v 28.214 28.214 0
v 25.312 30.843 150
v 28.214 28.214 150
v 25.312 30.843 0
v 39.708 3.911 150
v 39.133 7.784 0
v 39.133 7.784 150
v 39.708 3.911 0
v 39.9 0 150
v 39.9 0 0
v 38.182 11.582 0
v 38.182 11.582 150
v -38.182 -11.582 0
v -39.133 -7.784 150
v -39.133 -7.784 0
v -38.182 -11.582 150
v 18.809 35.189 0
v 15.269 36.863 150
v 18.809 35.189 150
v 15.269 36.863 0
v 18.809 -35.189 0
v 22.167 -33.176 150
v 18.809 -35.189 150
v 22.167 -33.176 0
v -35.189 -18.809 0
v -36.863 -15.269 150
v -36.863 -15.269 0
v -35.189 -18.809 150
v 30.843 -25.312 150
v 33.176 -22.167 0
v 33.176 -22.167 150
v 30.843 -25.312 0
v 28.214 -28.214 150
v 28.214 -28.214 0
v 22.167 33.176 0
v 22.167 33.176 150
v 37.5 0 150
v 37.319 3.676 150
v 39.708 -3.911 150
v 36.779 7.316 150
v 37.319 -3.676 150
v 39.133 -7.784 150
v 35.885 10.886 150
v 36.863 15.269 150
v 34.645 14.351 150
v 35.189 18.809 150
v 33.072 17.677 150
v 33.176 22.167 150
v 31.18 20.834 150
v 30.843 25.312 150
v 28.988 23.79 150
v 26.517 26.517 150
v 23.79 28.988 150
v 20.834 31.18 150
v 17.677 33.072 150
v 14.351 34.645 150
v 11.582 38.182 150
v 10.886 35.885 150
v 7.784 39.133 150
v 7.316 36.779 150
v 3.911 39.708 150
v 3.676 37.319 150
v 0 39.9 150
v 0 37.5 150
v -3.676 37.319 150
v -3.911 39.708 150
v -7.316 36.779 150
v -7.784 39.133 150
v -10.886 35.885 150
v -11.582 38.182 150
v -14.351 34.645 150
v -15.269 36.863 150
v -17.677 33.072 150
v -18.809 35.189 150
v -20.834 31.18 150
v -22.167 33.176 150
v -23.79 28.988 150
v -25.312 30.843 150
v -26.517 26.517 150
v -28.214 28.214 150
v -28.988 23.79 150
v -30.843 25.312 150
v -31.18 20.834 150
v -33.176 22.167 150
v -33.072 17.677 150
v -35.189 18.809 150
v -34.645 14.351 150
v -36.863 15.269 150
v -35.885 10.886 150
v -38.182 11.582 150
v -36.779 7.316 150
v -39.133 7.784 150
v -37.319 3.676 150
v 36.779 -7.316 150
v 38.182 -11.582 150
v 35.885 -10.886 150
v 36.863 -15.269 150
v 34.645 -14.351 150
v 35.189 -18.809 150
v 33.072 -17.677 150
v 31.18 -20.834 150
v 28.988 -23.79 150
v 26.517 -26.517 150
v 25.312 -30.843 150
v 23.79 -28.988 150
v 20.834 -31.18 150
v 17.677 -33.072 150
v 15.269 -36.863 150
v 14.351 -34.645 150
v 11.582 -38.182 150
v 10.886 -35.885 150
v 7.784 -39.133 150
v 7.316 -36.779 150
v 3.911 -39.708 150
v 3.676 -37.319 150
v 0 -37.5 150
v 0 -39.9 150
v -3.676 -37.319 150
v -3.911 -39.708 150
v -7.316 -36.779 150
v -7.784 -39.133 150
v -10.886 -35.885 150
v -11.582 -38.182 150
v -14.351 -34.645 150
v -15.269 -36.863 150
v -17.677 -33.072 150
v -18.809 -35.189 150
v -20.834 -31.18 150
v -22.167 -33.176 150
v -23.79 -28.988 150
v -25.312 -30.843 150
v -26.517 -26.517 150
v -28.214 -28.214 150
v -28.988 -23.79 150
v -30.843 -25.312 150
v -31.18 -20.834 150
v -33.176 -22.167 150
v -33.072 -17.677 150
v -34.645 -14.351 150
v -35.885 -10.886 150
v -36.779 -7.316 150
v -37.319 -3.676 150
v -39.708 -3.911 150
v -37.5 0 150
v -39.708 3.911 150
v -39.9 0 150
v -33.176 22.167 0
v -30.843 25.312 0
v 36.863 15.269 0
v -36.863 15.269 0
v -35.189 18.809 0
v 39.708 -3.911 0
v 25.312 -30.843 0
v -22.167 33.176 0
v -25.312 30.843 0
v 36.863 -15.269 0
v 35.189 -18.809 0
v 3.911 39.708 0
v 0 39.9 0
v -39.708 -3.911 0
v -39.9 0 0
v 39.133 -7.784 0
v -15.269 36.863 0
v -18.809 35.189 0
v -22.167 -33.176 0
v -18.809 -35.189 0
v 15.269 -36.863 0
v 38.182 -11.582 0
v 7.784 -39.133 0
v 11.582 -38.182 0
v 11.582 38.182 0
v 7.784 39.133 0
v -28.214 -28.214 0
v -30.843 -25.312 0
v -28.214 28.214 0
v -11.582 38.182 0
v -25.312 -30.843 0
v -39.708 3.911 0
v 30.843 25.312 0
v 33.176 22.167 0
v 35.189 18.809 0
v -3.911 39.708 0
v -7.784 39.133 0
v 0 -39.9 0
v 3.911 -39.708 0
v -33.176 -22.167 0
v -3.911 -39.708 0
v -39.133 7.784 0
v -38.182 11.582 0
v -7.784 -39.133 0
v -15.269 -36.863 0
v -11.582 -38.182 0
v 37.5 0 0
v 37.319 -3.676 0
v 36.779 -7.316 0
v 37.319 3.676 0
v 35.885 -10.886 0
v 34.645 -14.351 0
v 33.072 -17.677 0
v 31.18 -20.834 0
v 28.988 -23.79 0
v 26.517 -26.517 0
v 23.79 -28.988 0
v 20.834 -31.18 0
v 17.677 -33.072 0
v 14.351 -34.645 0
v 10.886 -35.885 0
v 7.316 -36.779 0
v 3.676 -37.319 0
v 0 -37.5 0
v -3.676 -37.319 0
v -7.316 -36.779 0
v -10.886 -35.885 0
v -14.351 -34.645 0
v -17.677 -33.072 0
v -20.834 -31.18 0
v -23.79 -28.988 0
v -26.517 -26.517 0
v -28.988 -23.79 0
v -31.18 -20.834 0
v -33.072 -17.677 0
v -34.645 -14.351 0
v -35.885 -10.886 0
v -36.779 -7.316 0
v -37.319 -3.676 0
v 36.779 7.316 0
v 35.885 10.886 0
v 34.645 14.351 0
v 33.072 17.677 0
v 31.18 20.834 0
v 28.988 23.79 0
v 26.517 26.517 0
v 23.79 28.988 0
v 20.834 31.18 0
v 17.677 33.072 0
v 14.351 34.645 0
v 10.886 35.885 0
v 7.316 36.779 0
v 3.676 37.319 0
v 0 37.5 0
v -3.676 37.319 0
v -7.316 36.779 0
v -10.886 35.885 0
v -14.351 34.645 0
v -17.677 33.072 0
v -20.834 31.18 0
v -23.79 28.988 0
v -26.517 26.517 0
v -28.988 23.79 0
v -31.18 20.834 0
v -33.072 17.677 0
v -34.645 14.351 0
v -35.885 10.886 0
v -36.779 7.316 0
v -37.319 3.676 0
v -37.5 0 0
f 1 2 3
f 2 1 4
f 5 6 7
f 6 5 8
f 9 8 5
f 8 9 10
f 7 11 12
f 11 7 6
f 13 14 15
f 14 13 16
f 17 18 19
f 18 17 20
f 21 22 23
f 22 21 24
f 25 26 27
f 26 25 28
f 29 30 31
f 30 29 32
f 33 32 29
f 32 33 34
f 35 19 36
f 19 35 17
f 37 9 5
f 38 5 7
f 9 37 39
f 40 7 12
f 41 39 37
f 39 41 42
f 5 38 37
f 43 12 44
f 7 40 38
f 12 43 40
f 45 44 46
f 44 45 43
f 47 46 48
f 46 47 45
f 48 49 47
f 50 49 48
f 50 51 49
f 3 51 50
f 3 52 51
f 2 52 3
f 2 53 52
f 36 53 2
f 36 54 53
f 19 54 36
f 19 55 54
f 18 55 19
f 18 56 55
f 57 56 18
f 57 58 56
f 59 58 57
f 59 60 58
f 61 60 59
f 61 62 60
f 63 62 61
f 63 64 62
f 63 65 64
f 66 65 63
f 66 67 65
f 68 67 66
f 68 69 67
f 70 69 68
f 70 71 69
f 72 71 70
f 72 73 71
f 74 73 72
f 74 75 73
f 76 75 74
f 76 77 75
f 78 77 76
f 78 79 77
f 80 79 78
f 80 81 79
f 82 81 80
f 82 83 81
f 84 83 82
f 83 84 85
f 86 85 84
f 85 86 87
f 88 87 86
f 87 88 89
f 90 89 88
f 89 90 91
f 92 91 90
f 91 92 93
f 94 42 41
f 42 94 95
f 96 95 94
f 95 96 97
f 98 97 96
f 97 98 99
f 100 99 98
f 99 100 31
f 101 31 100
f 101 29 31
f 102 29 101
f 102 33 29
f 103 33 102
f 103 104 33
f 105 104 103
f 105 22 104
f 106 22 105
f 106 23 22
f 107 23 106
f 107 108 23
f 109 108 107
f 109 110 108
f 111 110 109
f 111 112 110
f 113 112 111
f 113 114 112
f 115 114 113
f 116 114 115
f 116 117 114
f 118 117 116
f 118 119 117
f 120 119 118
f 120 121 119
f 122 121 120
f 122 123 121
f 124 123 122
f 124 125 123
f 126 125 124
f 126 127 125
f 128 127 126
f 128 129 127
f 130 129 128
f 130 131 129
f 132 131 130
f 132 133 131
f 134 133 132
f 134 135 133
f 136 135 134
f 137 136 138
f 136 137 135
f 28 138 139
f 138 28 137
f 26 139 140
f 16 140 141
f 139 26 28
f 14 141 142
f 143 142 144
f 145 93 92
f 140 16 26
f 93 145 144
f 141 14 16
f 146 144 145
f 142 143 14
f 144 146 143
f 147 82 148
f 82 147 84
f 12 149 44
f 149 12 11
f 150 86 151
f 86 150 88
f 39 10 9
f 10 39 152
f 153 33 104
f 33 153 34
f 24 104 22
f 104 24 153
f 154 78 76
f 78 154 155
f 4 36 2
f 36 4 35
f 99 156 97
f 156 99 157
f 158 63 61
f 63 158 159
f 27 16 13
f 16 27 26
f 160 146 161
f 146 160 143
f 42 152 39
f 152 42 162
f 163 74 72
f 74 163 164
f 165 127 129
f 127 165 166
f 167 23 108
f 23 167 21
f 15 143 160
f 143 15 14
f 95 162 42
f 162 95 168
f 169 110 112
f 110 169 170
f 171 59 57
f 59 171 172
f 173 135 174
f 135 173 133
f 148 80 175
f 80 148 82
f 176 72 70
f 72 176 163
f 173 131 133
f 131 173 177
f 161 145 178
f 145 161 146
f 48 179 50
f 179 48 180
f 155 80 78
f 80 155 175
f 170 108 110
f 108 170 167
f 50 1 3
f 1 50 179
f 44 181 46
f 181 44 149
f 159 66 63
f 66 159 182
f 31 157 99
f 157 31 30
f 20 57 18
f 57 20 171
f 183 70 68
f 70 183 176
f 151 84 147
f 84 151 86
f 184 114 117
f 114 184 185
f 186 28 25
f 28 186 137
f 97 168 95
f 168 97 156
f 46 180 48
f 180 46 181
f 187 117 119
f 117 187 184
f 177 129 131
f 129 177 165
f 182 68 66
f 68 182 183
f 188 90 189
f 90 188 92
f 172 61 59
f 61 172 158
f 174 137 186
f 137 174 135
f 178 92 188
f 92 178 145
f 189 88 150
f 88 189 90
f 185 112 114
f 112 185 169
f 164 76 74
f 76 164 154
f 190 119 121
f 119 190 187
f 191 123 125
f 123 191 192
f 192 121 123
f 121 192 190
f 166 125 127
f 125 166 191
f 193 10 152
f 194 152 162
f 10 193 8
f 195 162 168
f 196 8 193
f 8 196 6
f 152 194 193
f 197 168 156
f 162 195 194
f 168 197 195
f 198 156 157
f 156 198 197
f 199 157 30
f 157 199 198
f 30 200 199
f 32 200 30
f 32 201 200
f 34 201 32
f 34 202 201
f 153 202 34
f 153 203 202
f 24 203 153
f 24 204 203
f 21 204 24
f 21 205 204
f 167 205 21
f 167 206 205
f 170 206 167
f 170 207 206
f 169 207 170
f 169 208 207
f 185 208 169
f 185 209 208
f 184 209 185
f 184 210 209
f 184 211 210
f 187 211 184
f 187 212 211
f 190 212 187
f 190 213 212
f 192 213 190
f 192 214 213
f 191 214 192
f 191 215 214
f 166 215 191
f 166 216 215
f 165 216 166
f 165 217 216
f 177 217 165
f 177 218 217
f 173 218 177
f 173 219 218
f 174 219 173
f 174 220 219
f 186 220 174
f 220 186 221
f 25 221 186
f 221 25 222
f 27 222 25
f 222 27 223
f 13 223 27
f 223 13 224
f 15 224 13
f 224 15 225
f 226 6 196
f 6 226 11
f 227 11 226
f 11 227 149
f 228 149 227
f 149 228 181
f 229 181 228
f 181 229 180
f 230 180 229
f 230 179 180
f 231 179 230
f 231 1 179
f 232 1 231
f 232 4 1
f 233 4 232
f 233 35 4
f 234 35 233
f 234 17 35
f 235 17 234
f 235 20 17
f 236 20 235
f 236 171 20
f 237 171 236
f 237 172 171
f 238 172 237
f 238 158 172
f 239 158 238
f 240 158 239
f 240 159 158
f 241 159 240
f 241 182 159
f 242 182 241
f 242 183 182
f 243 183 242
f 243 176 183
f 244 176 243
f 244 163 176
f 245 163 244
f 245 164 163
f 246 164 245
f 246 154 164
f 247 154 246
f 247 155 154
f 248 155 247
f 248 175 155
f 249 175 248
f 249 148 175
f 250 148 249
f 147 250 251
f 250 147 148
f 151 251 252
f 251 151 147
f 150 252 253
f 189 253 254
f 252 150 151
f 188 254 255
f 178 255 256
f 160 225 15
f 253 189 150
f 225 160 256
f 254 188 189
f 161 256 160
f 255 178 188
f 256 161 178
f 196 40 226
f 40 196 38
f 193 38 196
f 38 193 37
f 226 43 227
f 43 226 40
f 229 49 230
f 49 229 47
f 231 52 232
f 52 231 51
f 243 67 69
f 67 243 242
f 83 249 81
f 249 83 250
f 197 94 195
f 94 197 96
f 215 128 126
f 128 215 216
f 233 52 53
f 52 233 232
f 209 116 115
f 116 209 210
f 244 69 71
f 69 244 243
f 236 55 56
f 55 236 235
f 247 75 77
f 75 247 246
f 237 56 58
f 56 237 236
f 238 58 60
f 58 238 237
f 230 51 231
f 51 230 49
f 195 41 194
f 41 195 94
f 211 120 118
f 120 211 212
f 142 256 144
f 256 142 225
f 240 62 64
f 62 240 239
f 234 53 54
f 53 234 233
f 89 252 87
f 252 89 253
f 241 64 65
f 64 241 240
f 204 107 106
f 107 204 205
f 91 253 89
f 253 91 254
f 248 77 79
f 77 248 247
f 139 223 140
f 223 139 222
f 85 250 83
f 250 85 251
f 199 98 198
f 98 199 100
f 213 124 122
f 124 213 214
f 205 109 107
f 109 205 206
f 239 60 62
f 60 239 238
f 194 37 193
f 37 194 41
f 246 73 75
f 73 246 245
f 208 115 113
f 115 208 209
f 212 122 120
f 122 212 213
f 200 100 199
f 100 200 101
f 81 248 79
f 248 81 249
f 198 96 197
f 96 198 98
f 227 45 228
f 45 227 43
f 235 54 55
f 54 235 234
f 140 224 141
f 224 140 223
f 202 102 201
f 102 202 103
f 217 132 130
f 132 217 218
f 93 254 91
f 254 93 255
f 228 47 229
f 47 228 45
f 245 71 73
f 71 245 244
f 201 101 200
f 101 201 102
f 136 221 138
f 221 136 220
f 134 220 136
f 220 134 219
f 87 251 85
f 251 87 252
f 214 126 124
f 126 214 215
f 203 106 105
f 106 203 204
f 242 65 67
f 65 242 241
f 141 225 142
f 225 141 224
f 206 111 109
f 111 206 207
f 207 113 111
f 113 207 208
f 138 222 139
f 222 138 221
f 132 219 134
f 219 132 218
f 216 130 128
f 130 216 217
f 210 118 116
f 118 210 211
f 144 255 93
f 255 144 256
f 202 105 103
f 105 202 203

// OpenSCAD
// Orientation probe: a plain 75 mm-bore tube, three ways.
bore = 75;      // internal diameter (mm)
wall = 2.4;     // wall thickness (mm)
len  = 150;     // segment length (mm)
part = "vertical";
$fn = 64;

module tube() {
    difference() {
        cylinder(d = bore + 2*wall, h = len);
        translate([0,0,-1]) cylinder(d = bore, h = len + 2);
    }
}

if (part == "vertical") tube();
else if (part == "horizontal") rotate([0,90,0]) tube();
else if (part == "clamshell")  // one half-shell, cut face down on the bed
    rotate([0,90,0]) intersection() {
        tube();
        translate([-100,0,-1]) cube([200,200,len+2]);
    }
